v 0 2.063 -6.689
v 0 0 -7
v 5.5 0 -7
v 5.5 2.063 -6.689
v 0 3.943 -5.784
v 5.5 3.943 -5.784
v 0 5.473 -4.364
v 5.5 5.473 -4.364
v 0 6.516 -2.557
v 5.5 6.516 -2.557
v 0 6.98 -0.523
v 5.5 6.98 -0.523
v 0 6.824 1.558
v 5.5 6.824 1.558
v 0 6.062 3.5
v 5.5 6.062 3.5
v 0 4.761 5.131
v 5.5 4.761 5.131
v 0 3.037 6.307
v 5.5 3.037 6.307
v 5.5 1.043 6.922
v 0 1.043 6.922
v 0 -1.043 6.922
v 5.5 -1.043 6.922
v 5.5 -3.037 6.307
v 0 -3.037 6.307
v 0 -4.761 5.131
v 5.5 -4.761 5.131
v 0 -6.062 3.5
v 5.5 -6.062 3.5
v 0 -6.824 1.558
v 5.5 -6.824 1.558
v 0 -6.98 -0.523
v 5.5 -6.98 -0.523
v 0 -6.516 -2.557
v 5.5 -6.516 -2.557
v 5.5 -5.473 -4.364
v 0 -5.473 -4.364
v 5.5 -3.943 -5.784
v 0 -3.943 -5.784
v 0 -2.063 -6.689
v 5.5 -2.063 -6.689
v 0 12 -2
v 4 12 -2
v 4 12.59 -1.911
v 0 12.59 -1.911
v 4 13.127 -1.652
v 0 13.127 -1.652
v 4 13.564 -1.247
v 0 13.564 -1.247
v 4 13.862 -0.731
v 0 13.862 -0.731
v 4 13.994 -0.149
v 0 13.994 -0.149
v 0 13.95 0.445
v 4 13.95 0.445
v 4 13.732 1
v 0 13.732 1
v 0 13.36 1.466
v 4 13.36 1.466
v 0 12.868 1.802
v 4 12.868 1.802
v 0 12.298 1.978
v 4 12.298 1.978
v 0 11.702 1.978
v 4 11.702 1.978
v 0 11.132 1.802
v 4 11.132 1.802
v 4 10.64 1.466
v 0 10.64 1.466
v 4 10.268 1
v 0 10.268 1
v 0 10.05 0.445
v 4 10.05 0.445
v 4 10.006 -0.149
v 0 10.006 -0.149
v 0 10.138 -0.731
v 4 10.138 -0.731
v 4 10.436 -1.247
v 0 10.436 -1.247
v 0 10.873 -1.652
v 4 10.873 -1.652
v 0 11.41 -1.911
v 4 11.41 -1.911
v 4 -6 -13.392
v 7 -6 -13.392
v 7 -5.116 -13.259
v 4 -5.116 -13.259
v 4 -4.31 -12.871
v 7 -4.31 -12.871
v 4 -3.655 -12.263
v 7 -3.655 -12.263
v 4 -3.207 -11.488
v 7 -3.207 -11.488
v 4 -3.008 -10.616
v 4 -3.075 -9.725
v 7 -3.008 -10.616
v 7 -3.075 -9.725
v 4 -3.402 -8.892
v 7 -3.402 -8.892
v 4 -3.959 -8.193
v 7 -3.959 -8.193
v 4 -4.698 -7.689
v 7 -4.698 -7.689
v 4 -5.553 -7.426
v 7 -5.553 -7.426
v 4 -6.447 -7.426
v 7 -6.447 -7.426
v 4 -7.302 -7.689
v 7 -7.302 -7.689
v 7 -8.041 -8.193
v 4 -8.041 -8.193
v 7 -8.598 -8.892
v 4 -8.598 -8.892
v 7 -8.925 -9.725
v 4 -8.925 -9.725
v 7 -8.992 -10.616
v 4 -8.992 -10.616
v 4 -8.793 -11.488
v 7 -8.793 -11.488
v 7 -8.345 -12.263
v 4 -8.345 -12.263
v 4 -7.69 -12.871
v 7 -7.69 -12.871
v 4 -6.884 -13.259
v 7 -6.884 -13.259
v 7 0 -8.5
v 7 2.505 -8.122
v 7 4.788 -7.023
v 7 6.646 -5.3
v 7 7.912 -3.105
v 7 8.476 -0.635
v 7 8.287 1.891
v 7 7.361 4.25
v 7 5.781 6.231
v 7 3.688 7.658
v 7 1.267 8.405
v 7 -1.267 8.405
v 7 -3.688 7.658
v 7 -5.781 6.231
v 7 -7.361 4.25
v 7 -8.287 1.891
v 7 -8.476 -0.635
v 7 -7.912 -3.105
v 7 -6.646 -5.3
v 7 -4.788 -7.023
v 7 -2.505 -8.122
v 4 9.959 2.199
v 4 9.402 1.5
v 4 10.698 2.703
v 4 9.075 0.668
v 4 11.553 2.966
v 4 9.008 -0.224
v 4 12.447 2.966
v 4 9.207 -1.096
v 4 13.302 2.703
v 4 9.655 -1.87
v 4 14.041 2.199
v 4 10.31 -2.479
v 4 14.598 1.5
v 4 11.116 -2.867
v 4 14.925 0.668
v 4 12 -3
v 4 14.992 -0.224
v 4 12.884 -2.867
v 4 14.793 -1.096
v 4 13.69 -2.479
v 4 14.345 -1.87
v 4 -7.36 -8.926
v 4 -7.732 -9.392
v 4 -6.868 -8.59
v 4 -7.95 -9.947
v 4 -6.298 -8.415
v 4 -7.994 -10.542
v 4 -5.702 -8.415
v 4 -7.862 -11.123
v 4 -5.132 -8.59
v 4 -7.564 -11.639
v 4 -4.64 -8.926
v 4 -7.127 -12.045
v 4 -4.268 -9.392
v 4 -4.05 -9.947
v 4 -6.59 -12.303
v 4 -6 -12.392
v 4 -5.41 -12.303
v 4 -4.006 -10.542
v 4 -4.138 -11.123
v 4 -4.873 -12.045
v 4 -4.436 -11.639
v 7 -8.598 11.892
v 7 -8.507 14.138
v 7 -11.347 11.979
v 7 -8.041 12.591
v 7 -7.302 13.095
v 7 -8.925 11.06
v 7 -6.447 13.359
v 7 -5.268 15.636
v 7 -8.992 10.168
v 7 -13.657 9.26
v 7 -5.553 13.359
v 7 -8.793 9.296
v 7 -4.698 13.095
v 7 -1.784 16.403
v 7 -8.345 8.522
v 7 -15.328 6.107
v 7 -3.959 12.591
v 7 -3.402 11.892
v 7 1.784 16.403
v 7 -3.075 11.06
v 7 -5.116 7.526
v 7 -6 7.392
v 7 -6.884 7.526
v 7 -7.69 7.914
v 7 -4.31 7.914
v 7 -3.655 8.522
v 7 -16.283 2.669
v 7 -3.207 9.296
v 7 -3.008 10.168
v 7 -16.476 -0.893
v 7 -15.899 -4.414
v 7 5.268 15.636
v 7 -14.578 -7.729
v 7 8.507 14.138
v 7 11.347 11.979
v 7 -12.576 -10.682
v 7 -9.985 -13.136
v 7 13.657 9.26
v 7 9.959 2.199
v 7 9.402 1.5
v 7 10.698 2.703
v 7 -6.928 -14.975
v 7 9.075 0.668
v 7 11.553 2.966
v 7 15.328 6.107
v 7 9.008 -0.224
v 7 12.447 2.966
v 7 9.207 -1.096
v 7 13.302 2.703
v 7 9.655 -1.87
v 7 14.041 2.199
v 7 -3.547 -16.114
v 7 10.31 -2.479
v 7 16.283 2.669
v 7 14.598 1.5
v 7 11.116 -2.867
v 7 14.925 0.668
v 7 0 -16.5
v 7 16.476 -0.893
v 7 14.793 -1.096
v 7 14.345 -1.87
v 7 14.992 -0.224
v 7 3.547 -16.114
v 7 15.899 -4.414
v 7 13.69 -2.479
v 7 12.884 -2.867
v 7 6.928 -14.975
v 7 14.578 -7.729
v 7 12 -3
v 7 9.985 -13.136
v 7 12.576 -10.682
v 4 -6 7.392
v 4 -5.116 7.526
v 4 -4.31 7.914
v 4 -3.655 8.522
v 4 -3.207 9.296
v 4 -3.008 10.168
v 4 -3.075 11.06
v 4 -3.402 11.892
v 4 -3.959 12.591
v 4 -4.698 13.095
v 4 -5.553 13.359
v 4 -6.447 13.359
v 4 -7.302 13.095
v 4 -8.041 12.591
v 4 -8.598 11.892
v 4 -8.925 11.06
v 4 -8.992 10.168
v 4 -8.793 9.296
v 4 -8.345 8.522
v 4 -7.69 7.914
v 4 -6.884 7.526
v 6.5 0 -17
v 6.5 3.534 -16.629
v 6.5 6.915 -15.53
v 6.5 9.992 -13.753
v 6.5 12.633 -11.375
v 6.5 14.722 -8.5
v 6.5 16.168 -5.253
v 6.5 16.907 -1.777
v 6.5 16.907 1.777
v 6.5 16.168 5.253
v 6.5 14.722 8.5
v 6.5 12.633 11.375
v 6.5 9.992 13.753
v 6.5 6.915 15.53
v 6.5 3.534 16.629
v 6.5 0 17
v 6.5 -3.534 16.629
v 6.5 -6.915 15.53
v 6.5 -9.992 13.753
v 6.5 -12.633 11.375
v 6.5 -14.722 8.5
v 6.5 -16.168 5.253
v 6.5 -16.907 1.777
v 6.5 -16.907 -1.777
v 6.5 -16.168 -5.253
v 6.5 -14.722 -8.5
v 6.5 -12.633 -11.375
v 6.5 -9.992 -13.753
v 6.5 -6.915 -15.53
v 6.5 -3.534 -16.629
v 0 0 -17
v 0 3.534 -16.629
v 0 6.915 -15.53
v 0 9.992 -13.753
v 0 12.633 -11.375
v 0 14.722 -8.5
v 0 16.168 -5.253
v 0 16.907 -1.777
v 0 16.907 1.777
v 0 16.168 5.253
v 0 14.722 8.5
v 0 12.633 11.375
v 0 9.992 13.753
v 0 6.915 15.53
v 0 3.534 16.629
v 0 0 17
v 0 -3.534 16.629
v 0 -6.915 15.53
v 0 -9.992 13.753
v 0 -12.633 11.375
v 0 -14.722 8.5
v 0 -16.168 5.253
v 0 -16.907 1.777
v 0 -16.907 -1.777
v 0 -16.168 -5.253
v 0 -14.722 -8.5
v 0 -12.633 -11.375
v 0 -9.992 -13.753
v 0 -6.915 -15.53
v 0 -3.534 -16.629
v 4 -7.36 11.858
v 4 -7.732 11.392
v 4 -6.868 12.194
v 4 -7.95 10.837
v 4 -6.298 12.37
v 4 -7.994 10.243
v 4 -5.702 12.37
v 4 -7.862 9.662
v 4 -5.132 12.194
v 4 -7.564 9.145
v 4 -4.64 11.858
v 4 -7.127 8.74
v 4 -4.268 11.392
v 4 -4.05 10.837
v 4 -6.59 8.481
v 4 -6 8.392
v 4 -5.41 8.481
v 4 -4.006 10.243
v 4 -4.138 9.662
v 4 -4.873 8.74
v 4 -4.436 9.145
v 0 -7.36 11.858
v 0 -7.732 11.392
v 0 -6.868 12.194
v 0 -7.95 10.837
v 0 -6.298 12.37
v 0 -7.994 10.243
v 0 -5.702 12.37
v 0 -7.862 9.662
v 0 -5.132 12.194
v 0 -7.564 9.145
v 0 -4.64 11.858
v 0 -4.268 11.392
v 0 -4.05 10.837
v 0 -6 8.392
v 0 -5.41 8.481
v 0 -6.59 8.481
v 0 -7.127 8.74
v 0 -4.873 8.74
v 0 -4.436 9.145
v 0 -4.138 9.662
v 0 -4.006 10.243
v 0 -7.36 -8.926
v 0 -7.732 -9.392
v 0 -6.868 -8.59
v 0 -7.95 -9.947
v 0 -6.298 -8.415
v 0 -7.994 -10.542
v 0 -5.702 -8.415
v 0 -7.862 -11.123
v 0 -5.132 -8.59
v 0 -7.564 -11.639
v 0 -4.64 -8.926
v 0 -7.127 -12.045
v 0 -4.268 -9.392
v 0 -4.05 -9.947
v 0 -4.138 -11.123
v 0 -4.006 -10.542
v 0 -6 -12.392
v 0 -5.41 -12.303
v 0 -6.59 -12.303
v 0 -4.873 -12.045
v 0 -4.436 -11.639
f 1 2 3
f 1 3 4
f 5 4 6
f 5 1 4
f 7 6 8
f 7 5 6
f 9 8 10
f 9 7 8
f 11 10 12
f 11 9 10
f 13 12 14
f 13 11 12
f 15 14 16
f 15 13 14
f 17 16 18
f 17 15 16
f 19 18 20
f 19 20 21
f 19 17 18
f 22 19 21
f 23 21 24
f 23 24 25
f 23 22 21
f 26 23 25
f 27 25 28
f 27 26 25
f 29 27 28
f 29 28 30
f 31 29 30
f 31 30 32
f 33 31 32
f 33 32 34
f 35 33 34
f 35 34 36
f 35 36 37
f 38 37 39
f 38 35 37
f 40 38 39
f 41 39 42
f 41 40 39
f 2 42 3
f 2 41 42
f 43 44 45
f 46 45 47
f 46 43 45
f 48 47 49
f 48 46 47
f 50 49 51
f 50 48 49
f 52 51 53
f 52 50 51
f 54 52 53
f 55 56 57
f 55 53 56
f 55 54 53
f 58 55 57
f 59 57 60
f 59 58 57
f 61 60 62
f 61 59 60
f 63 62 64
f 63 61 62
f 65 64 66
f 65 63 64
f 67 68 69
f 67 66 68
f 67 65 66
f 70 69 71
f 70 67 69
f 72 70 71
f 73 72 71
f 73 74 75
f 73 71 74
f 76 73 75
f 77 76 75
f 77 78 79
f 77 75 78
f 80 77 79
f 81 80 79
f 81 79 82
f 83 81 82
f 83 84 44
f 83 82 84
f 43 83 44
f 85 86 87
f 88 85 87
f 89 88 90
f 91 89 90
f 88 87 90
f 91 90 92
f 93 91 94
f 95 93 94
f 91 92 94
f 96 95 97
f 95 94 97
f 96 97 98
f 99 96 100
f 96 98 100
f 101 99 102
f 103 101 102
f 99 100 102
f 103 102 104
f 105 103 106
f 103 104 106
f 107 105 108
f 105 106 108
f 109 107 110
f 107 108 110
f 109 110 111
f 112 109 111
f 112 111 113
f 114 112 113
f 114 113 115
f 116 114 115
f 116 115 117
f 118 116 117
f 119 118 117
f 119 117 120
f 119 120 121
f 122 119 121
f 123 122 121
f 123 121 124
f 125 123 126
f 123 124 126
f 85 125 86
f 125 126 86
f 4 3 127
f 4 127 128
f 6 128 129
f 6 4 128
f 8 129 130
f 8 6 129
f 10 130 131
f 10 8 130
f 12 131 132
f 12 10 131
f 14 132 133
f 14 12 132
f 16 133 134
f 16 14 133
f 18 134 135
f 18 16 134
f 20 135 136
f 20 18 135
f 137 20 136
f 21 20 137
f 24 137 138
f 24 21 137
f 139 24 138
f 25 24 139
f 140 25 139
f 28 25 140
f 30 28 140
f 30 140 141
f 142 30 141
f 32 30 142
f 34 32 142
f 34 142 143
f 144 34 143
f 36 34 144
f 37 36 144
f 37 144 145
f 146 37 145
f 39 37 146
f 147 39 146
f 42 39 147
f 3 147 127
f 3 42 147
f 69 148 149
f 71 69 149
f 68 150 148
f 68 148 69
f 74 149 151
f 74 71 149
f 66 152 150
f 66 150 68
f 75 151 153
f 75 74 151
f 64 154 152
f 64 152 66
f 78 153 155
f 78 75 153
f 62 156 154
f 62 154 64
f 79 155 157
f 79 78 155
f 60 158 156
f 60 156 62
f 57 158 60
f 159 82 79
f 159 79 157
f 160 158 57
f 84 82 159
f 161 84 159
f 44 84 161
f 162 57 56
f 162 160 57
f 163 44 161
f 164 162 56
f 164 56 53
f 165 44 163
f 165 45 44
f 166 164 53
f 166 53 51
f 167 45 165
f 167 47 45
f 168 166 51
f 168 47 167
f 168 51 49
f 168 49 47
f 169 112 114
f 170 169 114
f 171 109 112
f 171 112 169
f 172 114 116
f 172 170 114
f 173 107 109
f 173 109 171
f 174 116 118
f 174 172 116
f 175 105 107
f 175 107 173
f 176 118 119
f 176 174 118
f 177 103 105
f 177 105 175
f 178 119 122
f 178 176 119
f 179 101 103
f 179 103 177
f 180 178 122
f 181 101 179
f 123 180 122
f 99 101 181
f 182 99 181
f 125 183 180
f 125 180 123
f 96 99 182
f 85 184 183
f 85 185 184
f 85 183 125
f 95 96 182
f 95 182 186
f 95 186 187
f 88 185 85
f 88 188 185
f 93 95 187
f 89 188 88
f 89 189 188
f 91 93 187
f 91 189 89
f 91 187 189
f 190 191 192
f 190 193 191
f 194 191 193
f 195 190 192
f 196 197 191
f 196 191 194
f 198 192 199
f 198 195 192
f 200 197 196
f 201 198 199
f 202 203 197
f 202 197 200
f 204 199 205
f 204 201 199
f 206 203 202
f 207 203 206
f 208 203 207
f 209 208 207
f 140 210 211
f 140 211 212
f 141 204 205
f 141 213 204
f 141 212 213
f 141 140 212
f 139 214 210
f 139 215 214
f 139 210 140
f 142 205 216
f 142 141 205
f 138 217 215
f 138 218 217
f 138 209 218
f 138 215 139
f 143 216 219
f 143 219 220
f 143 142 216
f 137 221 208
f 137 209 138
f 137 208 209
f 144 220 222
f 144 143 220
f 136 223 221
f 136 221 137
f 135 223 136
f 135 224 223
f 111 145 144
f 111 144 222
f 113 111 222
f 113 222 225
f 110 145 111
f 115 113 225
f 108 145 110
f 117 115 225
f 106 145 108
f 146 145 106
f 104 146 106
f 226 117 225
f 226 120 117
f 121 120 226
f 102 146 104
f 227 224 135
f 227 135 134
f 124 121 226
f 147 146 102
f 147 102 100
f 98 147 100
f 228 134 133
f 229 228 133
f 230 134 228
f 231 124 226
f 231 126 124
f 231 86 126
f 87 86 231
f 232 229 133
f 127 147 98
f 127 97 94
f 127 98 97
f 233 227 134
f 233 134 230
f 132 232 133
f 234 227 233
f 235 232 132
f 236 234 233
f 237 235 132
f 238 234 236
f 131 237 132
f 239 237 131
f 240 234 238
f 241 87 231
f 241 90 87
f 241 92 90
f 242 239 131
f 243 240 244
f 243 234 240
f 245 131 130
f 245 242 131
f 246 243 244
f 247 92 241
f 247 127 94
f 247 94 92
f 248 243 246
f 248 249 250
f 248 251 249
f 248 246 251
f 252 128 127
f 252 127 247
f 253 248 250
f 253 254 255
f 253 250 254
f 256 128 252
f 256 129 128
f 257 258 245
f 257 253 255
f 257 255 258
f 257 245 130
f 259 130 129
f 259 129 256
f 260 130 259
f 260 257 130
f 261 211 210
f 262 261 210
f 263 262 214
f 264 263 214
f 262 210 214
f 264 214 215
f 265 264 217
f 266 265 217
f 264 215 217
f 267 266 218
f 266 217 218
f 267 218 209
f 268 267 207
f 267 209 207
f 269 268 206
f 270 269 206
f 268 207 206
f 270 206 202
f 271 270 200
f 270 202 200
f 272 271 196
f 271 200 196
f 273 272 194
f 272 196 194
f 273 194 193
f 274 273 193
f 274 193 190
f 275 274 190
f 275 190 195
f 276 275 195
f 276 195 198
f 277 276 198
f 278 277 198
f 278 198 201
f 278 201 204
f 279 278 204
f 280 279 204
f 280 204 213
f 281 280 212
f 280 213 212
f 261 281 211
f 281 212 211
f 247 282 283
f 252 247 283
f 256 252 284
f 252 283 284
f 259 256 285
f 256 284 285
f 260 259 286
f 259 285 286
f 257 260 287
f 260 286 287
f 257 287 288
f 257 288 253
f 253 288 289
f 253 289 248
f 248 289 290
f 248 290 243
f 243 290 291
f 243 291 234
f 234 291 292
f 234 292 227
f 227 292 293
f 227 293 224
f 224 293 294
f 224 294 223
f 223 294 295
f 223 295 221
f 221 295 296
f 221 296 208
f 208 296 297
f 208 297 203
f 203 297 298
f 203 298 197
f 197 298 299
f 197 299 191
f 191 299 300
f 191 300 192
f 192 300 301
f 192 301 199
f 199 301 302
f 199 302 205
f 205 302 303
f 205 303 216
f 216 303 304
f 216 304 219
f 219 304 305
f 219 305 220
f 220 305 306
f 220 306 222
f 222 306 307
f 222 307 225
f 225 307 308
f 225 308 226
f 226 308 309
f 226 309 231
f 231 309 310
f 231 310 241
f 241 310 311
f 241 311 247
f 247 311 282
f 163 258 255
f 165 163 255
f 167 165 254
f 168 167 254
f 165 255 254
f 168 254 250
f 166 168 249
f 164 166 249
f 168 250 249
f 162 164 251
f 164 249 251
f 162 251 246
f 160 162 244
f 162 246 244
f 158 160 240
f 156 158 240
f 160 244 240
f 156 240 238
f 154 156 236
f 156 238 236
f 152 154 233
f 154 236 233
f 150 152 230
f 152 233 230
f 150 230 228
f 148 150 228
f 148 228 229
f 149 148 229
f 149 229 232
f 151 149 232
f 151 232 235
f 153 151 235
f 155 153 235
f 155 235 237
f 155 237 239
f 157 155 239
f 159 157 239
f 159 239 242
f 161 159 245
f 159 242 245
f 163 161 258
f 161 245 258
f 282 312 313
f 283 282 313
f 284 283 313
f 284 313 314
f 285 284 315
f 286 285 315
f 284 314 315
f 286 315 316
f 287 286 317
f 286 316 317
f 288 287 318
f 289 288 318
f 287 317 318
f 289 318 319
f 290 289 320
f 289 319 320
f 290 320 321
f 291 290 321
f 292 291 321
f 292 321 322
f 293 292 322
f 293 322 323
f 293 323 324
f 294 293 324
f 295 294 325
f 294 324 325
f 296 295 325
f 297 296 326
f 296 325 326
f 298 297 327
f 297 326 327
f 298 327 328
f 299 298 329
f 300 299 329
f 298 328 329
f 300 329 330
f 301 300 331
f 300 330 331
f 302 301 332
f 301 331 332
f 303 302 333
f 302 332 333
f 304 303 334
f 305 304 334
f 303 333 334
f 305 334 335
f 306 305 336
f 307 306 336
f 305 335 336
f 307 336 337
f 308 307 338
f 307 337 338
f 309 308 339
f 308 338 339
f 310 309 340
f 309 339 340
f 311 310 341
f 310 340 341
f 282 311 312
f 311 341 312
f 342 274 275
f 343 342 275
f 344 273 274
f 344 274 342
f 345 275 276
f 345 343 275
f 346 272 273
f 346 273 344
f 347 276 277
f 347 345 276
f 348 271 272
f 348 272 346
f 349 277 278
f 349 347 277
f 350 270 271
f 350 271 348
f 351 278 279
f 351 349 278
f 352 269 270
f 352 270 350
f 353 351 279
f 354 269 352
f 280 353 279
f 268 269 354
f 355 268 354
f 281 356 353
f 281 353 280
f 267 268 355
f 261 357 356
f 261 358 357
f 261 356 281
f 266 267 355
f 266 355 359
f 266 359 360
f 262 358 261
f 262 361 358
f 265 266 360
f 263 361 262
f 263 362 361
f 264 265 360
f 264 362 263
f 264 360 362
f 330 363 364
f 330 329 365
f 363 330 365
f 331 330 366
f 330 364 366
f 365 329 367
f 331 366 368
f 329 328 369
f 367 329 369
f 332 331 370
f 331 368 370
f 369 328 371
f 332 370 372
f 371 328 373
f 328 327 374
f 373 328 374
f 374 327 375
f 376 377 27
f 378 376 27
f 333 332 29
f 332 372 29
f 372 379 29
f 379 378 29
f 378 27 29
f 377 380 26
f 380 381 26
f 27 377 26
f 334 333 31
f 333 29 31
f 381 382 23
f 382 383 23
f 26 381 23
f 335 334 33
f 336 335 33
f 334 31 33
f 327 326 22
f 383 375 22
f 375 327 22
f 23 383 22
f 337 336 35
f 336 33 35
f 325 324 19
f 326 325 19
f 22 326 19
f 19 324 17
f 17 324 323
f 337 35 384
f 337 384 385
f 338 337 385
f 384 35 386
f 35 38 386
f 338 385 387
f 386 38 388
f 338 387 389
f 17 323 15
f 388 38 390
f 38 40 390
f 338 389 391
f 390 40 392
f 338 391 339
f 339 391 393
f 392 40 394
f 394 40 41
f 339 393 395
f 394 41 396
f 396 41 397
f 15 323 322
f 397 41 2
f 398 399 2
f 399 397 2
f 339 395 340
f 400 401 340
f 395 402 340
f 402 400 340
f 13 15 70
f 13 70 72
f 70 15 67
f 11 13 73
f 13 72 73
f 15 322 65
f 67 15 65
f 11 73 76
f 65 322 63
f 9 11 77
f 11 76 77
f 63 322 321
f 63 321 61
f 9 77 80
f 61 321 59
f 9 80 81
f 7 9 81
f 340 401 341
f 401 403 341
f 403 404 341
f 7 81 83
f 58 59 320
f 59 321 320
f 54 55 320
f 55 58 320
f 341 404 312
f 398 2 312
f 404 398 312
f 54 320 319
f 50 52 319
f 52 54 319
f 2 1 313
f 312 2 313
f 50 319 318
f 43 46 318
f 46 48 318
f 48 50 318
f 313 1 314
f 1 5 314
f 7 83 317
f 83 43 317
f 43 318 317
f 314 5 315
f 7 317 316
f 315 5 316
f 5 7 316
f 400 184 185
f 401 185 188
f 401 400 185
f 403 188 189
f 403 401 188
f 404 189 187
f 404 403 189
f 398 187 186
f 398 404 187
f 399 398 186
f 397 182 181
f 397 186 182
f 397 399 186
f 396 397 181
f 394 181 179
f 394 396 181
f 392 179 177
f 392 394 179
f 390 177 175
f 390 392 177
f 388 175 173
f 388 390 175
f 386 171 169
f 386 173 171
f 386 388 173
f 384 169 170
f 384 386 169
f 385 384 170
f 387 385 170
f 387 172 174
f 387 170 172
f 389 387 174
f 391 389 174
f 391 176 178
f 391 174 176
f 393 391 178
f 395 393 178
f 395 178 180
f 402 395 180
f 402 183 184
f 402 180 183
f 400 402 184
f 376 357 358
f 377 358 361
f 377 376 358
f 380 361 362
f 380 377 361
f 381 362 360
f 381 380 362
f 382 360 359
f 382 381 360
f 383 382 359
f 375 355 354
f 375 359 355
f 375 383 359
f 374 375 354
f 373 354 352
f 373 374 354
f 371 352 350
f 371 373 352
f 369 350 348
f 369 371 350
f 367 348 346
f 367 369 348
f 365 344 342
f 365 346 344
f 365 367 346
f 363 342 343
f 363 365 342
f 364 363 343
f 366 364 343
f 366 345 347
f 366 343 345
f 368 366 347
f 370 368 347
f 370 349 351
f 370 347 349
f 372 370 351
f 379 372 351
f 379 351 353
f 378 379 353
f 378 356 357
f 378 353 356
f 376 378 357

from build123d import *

# Parameters (mm, degrees)
SKETCH_1_R          = 17
SKETCH_1_R_2        = 7
SKETCH_1_R_3        = 2
EXTRUDE_1_DEPTH     = 7
SKETCH_2_R          = 3
CUT_EXTRUDE_1_DEPTH = 3
CHAMFER_1_SIZE      = 1.5
CHAMFER_2_SIZE      = 0.5


with BuildPart() as part:
    # 草图1 → 凸台-拉伸1 (new body)
    with BuildSketch(Plane(origin=(0, 0, 0), x_dir=(0, 0, -1), z_dir=(1, 0, 0))):
        Circle(SKETCH_1_R)
        Circle(SKETCH_1_R_2, mode=Mode.SUBTRACT)
        with Locations((0, 12)):
            Circle(SKETCH_1_R_3, mode=Mode.SUBTRACT)
        with Locations((10.392304845, -6)):
            Circle(SKETCH_1_R_3, mode=Mode.SUBTRACT)
        with Locations((-10.392304845, -6)):
            Circle(SKETCH_1_R_3, mode=Mode.SUBTRACT)
    extrude(amount=EXTRUDE_1_DEPTH)

    # 草图2 → 切除-拉伸1 (cut)
    with BuildSketch(Plane(origin=(7, 0, 0), x_dir=(0, 0, -1), z_dir=(1, 0, 0))):
        with Locations((0, 12)):
            Circle(SKETCH_2_R)
        with Locations((10.392304845, -6)):
            Circle(SKETCH_2_R)
        with Locations((-10.392304845, -6)):
            Circle(SKETCH_2_R)
    extrude(amount=-CUT_EXTRUDE_1_DEPTH, mode=Mode.SUBTRACT)

    # 倒角1
    chamfer_1_edges = [part.edges().sort_by_distance(p)[0] for p in [
        (7, 0, 7),
    ]]
    chamfer(chamfer_1_edges, length=CHAMFER_1_SIZE)

    # 倒角2
    chamfer_2_edges = [part.edges().sort_by_distance(p)[0] for p in [
        (7, 0, 17),
    ]]
    chamfer(chamfer_2_edges, length=CHAMFER_2_SIZE)


solid = part.part
